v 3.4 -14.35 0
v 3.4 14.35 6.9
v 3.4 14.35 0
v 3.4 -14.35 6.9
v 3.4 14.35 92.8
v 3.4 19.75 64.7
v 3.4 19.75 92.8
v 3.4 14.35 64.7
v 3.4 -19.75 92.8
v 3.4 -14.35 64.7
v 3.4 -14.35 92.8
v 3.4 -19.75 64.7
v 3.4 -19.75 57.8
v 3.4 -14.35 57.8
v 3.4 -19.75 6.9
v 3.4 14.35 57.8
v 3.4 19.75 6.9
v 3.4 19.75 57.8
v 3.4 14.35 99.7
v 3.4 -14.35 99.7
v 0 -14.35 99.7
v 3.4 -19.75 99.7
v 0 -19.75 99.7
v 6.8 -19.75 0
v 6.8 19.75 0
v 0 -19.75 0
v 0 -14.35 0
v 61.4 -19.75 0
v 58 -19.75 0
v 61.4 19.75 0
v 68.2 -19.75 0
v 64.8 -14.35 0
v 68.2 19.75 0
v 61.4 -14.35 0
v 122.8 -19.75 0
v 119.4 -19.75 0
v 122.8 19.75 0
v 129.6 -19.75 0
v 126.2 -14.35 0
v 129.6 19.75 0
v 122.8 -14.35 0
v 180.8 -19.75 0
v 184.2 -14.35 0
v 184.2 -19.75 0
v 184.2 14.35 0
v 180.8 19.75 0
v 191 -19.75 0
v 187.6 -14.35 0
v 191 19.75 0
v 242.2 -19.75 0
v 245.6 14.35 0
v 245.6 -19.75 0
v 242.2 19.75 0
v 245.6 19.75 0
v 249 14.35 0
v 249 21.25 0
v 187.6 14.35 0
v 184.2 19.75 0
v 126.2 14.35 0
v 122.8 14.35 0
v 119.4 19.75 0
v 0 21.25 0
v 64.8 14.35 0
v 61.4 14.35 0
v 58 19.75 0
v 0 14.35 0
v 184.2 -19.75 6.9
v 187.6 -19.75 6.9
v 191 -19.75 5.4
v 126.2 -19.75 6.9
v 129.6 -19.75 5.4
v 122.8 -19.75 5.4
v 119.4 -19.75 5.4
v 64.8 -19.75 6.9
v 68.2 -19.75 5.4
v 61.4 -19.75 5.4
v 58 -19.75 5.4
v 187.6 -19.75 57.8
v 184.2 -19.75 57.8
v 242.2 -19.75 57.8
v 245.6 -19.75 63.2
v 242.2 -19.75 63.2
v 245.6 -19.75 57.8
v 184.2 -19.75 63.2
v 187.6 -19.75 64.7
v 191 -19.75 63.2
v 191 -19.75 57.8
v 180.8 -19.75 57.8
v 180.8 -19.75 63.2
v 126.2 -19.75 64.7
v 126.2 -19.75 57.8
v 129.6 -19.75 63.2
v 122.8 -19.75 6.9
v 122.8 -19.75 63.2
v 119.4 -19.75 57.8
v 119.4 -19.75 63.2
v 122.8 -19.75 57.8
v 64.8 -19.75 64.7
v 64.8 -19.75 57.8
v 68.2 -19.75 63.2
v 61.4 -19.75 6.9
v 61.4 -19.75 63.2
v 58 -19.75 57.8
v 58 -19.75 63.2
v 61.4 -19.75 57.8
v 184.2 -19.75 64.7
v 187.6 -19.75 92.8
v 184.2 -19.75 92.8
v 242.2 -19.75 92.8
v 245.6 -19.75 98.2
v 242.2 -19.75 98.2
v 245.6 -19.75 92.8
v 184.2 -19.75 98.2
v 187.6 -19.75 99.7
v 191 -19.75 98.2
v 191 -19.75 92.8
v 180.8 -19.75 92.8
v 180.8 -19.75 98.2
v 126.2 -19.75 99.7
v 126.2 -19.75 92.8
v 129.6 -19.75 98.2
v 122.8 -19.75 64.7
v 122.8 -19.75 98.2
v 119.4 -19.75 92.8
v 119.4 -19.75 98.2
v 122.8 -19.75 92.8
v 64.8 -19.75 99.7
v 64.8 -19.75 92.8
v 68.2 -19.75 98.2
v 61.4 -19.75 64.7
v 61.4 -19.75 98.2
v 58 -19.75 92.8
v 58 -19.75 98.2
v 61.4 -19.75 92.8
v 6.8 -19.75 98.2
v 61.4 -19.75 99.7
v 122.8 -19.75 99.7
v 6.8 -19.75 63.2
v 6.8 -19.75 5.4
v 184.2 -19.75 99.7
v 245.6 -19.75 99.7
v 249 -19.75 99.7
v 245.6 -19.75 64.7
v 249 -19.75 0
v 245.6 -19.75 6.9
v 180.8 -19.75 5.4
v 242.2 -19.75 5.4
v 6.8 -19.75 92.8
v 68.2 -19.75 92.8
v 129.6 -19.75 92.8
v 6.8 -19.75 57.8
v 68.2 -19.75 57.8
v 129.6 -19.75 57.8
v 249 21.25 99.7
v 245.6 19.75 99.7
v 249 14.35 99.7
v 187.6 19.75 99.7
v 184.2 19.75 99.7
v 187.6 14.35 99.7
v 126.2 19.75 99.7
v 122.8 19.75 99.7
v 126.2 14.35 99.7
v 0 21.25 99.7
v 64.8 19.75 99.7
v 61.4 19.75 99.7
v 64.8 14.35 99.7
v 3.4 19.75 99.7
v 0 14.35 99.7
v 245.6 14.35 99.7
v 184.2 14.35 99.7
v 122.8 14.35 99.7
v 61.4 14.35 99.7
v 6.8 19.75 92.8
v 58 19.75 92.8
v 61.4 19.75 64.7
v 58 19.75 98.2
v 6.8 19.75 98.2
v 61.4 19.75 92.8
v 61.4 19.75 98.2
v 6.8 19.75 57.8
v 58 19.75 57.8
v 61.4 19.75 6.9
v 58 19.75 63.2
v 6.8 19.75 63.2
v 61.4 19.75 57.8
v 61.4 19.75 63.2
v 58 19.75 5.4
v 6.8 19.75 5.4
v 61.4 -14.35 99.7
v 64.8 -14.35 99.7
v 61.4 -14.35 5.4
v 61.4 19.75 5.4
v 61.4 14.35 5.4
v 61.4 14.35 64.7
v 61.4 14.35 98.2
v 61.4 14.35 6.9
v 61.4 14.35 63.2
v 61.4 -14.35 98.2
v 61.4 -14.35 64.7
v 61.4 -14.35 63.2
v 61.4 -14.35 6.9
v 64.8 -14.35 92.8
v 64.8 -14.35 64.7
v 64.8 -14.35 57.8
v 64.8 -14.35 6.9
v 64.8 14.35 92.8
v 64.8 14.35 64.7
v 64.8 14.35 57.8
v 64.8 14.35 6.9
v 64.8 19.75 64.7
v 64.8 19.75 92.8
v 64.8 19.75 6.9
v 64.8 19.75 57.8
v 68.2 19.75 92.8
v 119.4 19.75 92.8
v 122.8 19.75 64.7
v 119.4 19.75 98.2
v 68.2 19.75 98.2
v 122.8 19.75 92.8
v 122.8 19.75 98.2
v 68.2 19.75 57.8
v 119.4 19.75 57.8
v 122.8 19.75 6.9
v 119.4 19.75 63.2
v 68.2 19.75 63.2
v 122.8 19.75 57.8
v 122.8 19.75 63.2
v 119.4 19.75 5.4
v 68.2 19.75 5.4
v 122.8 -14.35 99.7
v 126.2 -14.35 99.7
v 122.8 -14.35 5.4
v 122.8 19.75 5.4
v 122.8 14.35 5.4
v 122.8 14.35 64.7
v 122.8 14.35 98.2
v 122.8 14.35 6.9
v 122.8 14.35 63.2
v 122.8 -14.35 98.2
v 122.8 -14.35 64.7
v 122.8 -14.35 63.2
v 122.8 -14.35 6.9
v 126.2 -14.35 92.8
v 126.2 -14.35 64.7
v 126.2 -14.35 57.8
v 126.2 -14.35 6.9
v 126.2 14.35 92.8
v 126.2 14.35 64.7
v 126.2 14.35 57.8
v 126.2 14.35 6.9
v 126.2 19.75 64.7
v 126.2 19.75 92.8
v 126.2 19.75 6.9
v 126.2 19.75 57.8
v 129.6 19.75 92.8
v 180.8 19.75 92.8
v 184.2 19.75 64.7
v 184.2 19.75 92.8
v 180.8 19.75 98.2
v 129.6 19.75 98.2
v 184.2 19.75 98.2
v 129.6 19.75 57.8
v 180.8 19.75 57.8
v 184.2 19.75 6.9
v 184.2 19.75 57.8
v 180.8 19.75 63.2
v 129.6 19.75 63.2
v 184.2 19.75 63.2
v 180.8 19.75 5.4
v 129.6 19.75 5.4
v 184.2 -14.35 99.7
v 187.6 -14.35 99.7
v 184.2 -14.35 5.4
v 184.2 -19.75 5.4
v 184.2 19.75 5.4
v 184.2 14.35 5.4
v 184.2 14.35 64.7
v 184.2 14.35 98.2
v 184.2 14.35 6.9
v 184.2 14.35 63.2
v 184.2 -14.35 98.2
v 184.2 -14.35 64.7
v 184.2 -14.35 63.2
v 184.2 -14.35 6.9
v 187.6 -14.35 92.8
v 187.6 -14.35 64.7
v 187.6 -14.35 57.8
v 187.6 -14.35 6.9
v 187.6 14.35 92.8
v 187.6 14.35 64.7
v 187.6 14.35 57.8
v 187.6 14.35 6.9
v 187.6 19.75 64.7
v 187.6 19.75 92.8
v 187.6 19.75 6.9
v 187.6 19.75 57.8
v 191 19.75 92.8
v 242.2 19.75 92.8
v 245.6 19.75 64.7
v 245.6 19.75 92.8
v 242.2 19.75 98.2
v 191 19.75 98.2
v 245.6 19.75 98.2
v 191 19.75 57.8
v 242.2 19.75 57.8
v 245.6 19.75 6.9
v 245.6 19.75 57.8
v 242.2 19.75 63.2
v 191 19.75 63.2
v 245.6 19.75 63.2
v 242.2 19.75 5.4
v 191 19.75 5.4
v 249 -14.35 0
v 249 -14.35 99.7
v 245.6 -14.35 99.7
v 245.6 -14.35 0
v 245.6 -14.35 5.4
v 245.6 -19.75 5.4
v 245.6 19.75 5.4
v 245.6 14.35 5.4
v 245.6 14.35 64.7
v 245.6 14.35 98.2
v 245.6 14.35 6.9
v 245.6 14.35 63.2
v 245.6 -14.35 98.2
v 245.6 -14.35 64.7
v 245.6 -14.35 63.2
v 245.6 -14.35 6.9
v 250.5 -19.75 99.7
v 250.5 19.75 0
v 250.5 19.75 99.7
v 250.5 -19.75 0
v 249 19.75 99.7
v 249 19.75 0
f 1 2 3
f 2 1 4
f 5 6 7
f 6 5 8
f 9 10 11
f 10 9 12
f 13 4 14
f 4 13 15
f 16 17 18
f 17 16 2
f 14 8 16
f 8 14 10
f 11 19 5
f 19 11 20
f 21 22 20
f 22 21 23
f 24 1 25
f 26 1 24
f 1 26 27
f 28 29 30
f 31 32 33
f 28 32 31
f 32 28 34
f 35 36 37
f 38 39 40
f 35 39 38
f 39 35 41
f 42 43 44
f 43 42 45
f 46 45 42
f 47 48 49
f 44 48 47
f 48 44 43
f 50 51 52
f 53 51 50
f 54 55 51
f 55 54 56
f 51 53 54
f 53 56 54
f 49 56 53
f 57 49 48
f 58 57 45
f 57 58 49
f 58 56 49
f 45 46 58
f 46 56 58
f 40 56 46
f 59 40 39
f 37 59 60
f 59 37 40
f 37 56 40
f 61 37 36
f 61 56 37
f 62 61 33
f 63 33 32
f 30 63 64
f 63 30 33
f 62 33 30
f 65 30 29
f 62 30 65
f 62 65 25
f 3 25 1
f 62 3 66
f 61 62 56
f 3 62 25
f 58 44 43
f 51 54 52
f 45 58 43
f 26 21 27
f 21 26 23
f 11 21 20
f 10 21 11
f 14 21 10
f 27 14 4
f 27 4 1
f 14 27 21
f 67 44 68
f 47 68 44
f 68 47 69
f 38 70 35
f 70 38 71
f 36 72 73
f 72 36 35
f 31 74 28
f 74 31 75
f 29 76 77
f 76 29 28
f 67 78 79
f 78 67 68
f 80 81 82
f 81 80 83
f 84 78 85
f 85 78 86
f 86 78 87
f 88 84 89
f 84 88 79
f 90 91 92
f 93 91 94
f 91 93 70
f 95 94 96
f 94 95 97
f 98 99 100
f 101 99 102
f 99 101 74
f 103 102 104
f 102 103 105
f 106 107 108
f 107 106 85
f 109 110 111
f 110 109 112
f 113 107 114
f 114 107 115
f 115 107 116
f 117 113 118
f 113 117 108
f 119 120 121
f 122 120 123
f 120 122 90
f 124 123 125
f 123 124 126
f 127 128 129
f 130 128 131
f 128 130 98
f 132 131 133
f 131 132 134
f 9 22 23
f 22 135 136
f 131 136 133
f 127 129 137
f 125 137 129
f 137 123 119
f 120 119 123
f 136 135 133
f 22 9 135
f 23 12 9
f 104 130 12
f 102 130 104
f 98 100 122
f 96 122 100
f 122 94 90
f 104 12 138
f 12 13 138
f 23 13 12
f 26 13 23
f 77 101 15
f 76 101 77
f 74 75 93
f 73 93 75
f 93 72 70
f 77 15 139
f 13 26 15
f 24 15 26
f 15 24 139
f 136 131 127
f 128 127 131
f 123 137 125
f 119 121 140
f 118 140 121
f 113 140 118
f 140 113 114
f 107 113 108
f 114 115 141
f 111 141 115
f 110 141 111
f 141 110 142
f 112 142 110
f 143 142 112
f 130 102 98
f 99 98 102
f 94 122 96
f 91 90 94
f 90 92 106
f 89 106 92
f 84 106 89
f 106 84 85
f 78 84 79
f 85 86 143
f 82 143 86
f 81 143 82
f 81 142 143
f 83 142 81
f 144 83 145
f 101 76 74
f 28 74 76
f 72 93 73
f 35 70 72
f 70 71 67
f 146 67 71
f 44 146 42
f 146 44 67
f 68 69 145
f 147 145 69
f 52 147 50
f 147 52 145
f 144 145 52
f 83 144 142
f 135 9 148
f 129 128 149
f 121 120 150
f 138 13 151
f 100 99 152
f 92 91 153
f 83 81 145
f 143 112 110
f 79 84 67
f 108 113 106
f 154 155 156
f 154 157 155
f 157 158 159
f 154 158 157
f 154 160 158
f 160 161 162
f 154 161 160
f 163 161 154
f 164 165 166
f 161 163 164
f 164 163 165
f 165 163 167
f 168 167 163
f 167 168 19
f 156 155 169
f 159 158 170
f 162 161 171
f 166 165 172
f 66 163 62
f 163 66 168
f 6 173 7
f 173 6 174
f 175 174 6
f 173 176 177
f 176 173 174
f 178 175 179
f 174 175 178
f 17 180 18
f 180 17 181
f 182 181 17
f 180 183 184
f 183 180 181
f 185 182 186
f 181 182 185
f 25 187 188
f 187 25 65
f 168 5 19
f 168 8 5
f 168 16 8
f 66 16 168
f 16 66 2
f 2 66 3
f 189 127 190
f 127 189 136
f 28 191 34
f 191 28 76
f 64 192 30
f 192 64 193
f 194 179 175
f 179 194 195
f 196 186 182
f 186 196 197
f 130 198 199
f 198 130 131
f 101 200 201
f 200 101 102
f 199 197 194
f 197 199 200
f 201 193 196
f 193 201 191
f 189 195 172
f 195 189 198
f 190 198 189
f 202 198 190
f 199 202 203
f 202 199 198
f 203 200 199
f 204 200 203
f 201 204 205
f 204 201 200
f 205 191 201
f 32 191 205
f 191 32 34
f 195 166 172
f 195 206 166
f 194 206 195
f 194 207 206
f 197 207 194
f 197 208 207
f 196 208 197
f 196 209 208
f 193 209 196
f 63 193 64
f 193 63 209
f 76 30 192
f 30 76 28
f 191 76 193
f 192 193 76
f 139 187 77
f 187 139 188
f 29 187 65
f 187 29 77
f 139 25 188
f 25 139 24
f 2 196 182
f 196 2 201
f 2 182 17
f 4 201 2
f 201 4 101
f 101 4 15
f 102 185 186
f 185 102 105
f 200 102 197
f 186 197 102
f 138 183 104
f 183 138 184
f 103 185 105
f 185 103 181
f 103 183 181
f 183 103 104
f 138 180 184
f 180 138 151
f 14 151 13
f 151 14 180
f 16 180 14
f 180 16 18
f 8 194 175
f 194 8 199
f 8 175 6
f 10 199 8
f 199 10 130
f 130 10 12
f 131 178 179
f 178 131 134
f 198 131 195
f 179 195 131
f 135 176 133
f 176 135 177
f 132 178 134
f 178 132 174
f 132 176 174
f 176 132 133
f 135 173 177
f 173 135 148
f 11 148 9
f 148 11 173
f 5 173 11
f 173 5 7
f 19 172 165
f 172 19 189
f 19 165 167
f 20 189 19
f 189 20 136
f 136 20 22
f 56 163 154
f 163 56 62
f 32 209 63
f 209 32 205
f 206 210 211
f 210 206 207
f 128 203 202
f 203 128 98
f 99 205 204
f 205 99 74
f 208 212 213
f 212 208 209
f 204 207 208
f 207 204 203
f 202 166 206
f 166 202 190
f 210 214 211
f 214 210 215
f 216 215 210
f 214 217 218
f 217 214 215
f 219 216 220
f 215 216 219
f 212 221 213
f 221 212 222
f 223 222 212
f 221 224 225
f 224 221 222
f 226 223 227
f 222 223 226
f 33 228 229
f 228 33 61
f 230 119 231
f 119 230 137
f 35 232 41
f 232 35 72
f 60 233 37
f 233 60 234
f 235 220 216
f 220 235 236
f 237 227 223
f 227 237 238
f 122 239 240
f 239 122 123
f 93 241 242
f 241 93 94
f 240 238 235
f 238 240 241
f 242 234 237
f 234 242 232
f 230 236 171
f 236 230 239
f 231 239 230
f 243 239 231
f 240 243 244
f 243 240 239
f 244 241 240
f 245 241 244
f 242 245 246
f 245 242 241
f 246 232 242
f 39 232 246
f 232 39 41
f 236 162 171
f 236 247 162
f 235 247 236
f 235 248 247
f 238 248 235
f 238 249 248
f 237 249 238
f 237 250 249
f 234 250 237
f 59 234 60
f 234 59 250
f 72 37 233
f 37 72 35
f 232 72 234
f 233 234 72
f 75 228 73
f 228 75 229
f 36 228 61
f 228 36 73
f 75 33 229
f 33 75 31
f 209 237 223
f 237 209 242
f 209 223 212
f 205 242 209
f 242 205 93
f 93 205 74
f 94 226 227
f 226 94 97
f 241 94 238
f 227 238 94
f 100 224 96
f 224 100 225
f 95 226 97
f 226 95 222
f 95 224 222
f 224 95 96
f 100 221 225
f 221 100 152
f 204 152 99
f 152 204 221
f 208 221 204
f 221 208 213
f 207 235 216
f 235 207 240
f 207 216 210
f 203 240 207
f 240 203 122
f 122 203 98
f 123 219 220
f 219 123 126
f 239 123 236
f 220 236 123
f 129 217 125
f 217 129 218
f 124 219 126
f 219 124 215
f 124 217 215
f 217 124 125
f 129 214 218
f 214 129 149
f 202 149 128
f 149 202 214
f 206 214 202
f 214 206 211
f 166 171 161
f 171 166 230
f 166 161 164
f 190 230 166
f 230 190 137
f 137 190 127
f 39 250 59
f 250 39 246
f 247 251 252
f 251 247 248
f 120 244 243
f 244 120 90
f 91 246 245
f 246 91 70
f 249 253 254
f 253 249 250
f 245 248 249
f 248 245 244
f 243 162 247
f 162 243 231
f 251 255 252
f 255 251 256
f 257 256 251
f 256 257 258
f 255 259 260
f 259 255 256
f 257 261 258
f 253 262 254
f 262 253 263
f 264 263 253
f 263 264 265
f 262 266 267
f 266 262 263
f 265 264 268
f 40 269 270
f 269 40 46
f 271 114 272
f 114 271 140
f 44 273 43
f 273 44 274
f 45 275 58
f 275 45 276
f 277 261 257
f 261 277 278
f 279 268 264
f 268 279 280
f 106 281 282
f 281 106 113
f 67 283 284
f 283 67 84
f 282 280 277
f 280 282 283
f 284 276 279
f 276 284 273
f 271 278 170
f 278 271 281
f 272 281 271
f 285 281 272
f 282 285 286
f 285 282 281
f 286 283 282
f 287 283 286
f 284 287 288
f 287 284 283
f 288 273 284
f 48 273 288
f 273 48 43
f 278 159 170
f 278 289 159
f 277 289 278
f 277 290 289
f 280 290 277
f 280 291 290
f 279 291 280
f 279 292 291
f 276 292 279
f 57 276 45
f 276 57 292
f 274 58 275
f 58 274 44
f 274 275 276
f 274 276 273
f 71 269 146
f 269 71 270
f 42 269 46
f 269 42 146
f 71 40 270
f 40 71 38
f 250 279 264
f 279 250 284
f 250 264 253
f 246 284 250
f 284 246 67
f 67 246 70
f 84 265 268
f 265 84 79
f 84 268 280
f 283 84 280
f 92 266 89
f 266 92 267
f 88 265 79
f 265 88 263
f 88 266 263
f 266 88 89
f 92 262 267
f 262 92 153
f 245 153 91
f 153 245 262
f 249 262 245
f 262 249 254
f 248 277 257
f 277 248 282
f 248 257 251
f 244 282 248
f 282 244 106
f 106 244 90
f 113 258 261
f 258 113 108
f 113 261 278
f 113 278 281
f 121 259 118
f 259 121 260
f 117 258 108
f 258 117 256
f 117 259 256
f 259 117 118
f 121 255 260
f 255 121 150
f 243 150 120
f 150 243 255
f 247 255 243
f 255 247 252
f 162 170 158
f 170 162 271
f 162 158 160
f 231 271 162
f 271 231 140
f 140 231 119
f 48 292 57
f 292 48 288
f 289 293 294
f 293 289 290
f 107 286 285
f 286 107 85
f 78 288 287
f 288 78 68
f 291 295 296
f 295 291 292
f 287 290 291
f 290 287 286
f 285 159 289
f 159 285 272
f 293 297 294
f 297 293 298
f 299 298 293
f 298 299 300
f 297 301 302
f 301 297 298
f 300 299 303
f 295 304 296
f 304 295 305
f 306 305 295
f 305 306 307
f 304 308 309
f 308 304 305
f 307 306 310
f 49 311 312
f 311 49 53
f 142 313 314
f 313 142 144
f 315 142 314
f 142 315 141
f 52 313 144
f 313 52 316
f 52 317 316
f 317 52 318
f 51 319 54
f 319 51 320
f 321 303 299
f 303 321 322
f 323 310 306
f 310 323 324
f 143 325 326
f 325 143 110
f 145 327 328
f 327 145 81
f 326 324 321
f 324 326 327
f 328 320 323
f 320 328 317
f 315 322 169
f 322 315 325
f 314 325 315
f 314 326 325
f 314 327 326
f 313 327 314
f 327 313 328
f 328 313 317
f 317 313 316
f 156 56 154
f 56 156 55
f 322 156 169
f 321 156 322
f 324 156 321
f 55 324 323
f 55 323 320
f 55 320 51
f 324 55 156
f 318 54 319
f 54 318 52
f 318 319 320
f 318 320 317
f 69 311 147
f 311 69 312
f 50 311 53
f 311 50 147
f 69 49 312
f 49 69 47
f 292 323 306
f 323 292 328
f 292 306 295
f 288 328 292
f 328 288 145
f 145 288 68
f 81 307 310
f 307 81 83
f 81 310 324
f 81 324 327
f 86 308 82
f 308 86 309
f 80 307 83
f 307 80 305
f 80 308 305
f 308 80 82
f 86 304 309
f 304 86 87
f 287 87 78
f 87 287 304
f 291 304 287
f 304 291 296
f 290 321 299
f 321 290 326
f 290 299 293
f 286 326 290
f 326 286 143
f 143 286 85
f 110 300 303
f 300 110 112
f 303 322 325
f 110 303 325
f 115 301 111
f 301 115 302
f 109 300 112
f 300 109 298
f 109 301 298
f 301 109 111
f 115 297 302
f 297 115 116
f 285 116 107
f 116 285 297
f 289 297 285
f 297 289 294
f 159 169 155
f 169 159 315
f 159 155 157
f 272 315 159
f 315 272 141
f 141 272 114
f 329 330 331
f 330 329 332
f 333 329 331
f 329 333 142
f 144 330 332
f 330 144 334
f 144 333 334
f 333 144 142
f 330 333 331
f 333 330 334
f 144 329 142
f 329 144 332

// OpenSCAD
width = 58 + 2 * 3.4;
height = 99.7;
depth = 39.5;

holder_x = 3.4;
holder_y = 5.4;

plate_width = width - 2 * holder_x;
plate_height = 1.5;

middle_layer_height = height - plate_height - 35;

module main_holder()
{
	translate([-width / 2, -depth / 2, 0])
		cube([holder_x, holder_y, height]);

	translate([-width / 2, depth / 2 - holder_y, 0])
		cube([holder_x, holder_y, height]);

	translate([width / 2 - holder_x, -depth / 2, 0])
		cube([holder_x, holder_y, height]);

	translate([width / 2 - holder_x, depth / 2 - holder_y, 0])
		cube([holder_x, holder_y, height]);

	for(i = [0:3])
		echo("Holder", [holder_x, holder_y, height]);
};

module plate_with_holder()
{
	//holder
	translate([width / 2 - 2 * holder_x, -depth / 2, 0])
		cube([holder_x, depth, holder_y]);

	translate([-width / 2 + holder_x, -depth / 2, 0])
		cube([holder_x, depth, holder_y]);

	for(i = [0:1])
		echo("Plate Holder", [holder_x, depth, holder_y]);
	
	//plate
	translate([-plate_width / 2, -depth / 2, holder_y])
		cube([plate_width, depth, plate_height]);

	echo("Plate", [plate_width, depth, plate_height]);
}

module shelf()
{
	main_holder();
	
	plate_with_holder();

	translate([0, 0, middle_layer_height - holder_y])
		plate_with_holder();

	translate([0, 0, height - holder_y - plate_height])
		plate_with_holder();

	//back plane
	translate([-width / 2, depth / 2, 0])
		cube([width, plate_height, height]);

	echo("Back Plane", [width, plate_height, height]);
};

translate([2 * width - 1.5 * holder_x, 0, 0])
	union()
	{
		translate([-1.5 * width + 1.5 * holder_x, 0, 0])
			shelf();

		translate([-width / 2 + holder_x / 2, 0, 0])
			shelf();

		translate([width / 2 - holder_x / 2, 0, 0])
			shelf();

		translate([1.5 * width - 1.5 * holder_x, 0, 0])
			shelf();

		//end plate
		translate([2 * width - 1.5 * holder_x, -depth / 2, 0])
			cube([plate_height, depth, height]);

		echo("Side Plane", [plate_height, depth, height]);
	};
